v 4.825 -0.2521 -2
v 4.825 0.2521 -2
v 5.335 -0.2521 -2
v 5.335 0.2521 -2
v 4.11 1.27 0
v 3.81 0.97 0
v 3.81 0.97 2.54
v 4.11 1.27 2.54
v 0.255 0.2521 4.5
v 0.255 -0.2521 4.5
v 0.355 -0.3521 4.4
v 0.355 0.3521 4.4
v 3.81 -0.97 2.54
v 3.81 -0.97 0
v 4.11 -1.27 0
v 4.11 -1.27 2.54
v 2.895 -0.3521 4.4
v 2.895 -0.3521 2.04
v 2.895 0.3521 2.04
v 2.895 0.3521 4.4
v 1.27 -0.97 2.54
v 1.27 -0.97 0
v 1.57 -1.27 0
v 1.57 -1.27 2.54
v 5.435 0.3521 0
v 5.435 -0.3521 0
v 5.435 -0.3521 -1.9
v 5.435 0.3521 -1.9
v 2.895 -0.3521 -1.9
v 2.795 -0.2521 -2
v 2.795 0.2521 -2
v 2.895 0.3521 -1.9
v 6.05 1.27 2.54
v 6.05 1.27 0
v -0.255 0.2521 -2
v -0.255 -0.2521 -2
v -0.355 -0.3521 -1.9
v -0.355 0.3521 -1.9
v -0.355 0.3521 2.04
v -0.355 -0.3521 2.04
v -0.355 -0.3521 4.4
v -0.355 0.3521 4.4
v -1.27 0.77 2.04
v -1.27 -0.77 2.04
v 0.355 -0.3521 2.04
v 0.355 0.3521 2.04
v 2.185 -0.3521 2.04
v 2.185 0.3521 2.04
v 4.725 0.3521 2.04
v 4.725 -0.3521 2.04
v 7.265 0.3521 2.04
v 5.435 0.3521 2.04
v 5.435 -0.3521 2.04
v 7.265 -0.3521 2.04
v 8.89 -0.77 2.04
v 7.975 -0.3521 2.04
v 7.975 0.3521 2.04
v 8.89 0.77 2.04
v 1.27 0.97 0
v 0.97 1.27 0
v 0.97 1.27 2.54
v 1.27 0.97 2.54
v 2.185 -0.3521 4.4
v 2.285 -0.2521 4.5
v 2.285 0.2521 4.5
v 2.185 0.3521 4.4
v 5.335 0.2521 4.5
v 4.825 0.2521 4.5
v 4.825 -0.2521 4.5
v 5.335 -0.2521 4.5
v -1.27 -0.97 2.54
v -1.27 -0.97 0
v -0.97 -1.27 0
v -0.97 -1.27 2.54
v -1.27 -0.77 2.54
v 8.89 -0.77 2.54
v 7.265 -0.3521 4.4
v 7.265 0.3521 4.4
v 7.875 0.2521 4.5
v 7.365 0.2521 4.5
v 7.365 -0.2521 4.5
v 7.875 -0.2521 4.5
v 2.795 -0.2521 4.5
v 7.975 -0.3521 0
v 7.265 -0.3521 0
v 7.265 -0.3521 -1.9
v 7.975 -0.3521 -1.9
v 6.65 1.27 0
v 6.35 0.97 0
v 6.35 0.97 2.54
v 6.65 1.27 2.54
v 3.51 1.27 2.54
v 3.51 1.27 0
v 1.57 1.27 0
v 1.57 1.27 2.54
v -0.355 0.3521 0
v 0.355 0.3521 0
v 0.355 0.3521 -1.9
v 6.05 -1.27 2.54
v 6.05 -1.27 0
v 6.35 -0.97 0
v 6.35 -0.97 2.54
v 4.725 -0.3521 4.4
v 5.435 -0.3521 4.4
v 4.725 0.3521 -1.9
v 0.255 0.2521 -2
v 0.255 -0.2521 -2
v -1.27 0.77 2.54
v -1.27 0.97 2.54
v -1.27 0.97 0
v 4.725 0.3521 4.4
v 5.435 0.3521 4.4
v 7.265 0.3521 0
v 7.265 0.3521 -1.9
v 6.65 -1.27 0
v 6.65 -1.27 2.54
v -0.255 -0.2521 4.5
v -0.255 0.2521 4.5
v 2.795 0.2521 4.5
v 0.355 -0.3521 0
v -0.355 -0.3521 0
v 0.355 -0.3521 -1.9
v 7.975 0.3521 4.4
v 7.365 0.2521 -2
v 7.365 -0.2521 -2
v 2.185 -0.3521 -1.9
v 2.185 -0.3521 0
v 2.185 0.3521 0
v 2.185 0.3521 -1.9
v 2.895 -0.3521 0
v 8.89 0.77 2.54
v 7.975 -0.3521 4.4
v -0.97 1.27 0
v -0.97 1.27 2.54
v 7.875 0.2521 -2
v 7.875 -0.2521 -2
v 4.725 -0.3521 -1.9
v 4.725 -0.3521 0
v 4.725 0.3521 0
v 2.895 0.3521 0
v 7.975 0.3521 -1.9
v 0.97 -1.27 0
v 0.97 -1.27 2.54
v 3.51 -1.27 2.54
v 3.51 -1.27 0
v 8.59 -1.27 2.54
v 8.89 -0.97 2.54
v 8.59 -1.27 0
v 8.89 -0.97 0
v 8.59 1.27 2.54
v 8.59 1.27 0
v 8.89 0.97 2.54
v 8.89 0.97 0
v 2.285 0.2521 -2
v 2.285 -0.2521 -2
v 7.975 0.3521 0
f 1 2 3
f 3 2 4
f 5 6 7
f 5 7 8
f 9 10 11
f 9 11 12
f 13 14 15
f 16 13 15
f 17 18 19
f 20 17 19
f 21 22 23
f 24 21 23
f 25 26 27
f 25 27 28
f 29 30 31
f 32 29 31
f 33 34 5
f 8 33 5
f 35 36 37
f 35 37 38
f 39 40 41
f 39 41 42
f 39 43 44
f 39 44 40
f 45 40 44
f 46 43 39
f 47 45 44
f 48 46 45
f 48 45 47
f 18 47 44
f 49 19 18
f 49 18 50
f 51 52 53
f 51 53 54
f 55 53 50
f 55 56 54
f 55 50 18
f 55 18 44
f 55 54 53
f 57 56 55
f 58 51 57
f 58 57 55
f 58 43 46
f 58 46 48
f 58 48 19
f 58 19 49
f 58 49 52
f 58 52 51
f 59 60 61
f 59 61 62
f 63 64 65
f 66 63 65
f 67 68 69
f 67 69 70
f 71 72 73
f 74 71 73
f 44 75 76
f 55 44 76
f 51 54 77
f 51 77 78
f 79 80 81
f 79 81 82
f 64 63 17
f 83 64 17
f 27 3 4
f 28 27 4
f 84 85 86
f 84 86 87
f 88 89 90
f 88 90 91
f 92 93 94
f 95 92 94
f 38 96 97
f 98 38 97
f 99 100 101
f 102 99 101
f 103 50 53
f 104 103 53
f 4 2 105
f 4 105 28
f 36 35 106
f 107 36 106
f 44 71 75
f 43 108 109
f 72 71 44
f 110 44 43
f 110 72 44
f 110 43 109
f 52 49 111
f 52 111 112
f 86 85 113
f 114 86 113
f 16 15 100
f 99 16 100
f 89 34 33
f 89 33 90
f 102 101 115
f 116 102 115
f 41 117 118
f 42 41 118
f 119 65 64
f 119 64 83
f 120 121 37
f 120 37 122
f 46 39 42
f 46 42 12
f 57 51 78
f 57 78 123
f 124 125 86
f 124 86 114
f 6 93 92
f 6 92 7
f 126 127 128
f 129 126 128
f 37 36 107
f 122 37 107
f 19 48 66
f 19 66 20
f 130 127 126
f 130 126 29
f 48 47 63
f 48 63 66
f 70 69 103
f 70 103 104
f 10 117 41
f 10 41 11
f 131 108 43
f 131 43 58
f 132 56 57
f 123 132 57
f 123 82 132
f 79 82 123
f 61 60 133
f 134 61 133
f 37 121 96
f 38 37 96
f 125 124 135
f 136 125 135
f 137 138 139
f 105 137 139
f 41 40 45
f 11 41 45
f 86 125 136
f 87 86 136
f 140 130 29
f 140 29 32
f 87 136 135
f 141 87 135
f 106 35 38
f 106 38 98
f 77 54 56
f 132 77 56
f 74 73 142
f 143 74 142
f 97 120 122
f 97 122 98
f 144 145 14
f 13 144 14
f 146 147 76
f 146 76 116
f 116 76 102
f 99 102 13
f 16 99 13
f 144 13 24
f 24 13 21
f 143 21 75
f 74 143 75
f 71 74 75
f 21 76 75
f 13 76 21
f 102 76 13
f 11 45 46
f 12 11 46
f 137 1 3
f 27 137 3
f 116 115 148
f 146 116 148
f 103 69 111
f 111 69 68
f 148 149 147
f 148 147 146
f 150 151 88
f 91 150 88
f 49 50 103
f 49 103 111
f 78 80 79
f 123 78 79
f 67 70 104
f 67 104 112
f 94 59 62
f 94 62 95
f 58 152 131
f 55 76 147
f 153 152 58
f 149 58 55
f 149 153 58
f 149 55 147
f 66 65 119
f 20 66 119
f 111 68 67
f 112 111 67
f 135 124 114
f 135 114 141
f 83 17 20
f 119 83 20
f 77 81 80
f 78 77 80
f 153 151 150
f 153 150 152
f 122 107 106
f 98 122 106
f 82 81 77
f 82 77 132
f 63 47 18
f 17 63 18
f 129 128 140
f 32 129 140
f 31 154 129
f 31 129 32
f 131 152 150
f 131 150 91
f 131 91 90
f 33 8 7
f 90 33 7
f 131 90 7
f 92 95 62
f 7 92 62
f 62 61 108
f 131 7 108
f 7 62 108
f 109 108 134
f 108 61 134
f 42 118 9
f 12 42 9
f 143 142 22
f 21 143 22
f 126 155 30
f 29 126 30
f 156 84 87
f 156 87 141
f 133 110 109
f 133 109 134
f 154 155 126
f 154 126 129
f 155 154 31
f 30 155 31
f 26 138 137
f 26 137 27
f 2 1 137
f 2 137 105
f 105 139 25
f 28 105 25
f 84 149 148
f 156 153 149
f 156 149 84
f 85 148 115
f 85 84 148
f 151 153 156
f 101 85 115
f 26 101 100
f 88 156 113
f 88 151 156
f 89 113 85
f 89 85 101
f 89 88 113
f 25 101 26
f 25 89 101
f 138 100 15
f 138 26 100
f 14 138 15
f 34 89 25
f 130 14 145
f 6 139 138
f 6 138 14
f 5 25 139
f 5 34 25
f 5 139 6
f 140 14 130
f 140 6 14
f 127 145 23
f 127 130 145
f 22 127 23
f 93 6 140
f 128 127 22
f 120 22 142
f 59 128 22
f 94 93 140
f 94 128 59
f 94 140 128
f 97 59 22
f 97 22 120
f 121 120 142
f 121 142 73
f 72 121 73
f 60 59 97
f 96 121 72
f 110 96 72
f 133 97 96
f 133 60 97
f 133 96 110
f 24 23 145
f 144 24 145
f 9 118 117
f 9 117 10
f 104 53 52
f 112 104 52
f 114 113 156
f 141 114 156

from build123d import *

# Parameters (mm, degrees)
SKETCH_1_W          = 0.709981308
SKETCH_1_H          = 0.70422052
EXTRUDE_1_DEPTH     = 10
EXTRUDE_1_2_DEPTH   = 10
EXTRUDE_1_3_DEPTH   = 10
EXTRUDE_1_4_DEPTH   = 10
EXTRUDE_2_DEPTH     = 2.54
SKETCH_4_W          = 10.16
SKETCH_4_H          = 1.54
CUT_EXTRUDE_2_DEPTH = 0.5
SKETCH_1_2_W        = 0.709981308
SKETCH_1_2_H        = 0.70422052
EXTRUDE_3_DEPTH     = 2
CUT_EXTRUDE_1_DEPTH = 2.54
SKETCH_1_3_W        = 0.709981308
SKETCH_1_3_H        = 0.70422052
EXTRUDE_4_DEPTH     = 4.5
CHAMFER_1_SIZE      = 0.1


with BuildPart() as part:
    # 草图1 → 凸台-拉伸1 (new body)
    with BuildSketch(Plane.XY):
        with Locations((2.54, 0)):
            Rectangle(SKETCH_1_W, SKETCH_1_H)
    extrude(amount=EXTRUDE_1_DEPTH)



with BuildPart() as body_2:
    # 草图1 → Extrude 1 2 (new body)
    with BuildSketch(Plane.XY):
        Rectangle(SKETCH_1_W, SKETCH_1_H)
    extrude(amount=EXTRUDE_1_2_DEPTH)


with BuildPart() as body_3:
    # 草图1 → Extrude 1 3 (new body)
    with BuildSketch(Plane.XY):
        with Locations((5.08, 0)):
            Rectangle(SKETCH_1_W, SKETCH_1_H)
    extrude(amount=EXTRUDE_1_3_DEPTH)


with BuildPart() as body_4:
    # 草图1 → Extrude 1 4 (new body)
    with BuildSketch(Plane.XY):
        with Locations((7.62, 0)):
            Rectangle(SKETCH_1_W, SKETCH_1_H)
    extrude(amount=EXTRUDE_1_4_DEPTH)


with BuildPart() as part_1:
    add(part.part)

    add(body_2.part)  # 凸台-拉伸2 merges body 2

    add(body_3.part)  # 凸台-拉伸2 merges body 3

    add(body_4.part)  # 凸台-拉伸2 merges body 4
    # 草图2 → 凸台-拉伸2 (add)
    with BuildSketch(Plane.XY):
        Polygon((-1.27, 1.27), (1.27, 1.27), (6.35, 1.27), (8.89, 1.27), (8.89, -1.27), (6.35, -1.27), (1.27, -1.27), (-1.27, -1.27), align=None)
    extrude(amount=EXTRUDE_2_DEPTH)

    # 草图4 → 切除-拉伸2 (cut)
    with BuildSketch(Plane.XY.offset(2.54)):
        with Locations((3.81, 0)):
            Rectangle(SKETCH_4_W, SKETCH_4_H)
    extrude(amount=-CUT_EXTRUDE_2_DEPTH, mode=Mode.SUBTRACT)


with BuildPart() as body_2_2:
    # of the pieces the cut leaves, the one that is kept (cut_extrude_2_keep)
    add(part_1.part.solids().sort_by_distance((8.89, 1.27, 0))[0])

    # 草图1<2> → 凸台-拉伸3 (add)
    with BuildSketch(Plane.XY):
        with Locations((2.54, 0)):
            Rectangle(SKETCH_1_2_W, SKETCH_1_2_H)
        Rectangle(SKETCH_1_2_W, SKETCH_1_2_H)
        with Locations((5.08, 0)):
            Rectangle(SKETCH_1_2_W, SKETCH_1_2_H)
        with Locations((7.62, 0)):
            Rectangle(SKETCH_1_2_W, SKETCH_1_2_H)
    extrude(amount=-EXTRUDE_3_DEPTH)

    # 草图3 → 切除-拉伸1 (cut)
    with BuildSketch(Plane(origin=(0, 0, 0), x_dir=(-1, 0, 0), z_dir=(0, 0, -1))):
        Polygon((-8.59, 1.27), (-8.89, 0.97), (-8.89, 1.27), align=None)
        Polygon((-6.05, 1.27), (-6.35, 0.97), (-6.65, 1.27), align=None)
        Polygon((-3.51, 1.27), (-3.81, 0.97), (-4.11, 1.27), align=None)
        Polygon((-0.97, 1.27), (-1.27, 0.97), (-1.57, 1.27), align=None)
        Polygon((1.57, 1.27), (1.27, 0.97), (0.97, 1.27), align=None)
        Polygon((0.97, -1.27), (1.57, -1.27), (1.27, -0.97), align=None)
        Polygon((-1.57, -1.27), (-0.97, -1.27), (-1.27, -0.97), align=None)
        Polygon((-4.11, -1.27), (-3.51, -1.27), (-3.81, -0.97), align=None)
        Polygon((-6.65, -1.27), (-6.05, -1.27), (-6.35, -0.97), align=None)
        Polygon((-8.89, -1.27), (-8.89, -0.97), (-8.59, -1.27), align=None)
    extrude(amount=-CUT_EXTRUDE_1_DEPTH, mode=Mode.SUBTRACT)

    # 草图1<3> → 凸台-拉伸4 (add)
    with BuildSketch(Plane.XY):
        with Locations((2.54, 0)):
            Rectangle(SKETCH_1_3_W, SKETCH_1_3_H)
        Rectangle(SKETCH_1_3_W, SKETCH_1_3_H)
        with Locations((5.08, 0)):
            Rectangle(SKETCH_1_3_W, SKETCH_1_3_H)
        with Locations((7.62, 0)):
            Rectangle(SKETCH_1_3_W, SKETCH_1_3_H)
    extrude(amount=EXTRUDE_4_DEPTH)

    # 倒角1
    chamfer_1_edges = [body_2_2.edges().sort_by_distance(p)[0] for p in [
        (0.354990654, 0, -2),
        (0, -0.35211026, -2),
        (-0.354990654, 0, -2),
        (0, 0.35211026, -2),
        (2.894990654, 0, -2),
        (2.54, -0.35211026, -2),
        (2.185009346, 0, -2),
        (2.54, 0.35211026, -2),
        (5.434990654, 0, -2),
        (5.08, -0.35211026, -2),
        (4.725009346, 0, -2),
        (5.08, 0.35211026, -2),
        (7.974990654, 0, -2),
        (7.62, -0.35211026, -2),
        (7.265009346, 0, -2),
        (7.62, 0.35211026, -2),
        (0.354990654, 0, 4.5),
        (0, 0.35211026, 4.5),
        (-0.354990654, 0, 4.5),
        (0, -0.35211026, 4.5),
        (2.894990654, 0, 4.5),
        (2.54, 0.35211026, 4.5),
        (2.185009346, 0, 4.5),
        (2.54, -0.35211026, 4.5),
        (5.434990654, 0, 4.5),
        (5.08, 0.35211026, 4.5),
        (4.725009346, 0, 4.5),
        (5.08, -0.35211026, 4.5),
        (7.974990654, 0, 4.5),
        (7.62, 0.35211026, 4.5),
        (7.265009346, 0, 4.5),
        (7.62, -0.35211026, 4.5),
    ]]
    chamfer(chamfer_1_edges, length=CHAMFER_1_SIZE)


solid = body_2_2.part
